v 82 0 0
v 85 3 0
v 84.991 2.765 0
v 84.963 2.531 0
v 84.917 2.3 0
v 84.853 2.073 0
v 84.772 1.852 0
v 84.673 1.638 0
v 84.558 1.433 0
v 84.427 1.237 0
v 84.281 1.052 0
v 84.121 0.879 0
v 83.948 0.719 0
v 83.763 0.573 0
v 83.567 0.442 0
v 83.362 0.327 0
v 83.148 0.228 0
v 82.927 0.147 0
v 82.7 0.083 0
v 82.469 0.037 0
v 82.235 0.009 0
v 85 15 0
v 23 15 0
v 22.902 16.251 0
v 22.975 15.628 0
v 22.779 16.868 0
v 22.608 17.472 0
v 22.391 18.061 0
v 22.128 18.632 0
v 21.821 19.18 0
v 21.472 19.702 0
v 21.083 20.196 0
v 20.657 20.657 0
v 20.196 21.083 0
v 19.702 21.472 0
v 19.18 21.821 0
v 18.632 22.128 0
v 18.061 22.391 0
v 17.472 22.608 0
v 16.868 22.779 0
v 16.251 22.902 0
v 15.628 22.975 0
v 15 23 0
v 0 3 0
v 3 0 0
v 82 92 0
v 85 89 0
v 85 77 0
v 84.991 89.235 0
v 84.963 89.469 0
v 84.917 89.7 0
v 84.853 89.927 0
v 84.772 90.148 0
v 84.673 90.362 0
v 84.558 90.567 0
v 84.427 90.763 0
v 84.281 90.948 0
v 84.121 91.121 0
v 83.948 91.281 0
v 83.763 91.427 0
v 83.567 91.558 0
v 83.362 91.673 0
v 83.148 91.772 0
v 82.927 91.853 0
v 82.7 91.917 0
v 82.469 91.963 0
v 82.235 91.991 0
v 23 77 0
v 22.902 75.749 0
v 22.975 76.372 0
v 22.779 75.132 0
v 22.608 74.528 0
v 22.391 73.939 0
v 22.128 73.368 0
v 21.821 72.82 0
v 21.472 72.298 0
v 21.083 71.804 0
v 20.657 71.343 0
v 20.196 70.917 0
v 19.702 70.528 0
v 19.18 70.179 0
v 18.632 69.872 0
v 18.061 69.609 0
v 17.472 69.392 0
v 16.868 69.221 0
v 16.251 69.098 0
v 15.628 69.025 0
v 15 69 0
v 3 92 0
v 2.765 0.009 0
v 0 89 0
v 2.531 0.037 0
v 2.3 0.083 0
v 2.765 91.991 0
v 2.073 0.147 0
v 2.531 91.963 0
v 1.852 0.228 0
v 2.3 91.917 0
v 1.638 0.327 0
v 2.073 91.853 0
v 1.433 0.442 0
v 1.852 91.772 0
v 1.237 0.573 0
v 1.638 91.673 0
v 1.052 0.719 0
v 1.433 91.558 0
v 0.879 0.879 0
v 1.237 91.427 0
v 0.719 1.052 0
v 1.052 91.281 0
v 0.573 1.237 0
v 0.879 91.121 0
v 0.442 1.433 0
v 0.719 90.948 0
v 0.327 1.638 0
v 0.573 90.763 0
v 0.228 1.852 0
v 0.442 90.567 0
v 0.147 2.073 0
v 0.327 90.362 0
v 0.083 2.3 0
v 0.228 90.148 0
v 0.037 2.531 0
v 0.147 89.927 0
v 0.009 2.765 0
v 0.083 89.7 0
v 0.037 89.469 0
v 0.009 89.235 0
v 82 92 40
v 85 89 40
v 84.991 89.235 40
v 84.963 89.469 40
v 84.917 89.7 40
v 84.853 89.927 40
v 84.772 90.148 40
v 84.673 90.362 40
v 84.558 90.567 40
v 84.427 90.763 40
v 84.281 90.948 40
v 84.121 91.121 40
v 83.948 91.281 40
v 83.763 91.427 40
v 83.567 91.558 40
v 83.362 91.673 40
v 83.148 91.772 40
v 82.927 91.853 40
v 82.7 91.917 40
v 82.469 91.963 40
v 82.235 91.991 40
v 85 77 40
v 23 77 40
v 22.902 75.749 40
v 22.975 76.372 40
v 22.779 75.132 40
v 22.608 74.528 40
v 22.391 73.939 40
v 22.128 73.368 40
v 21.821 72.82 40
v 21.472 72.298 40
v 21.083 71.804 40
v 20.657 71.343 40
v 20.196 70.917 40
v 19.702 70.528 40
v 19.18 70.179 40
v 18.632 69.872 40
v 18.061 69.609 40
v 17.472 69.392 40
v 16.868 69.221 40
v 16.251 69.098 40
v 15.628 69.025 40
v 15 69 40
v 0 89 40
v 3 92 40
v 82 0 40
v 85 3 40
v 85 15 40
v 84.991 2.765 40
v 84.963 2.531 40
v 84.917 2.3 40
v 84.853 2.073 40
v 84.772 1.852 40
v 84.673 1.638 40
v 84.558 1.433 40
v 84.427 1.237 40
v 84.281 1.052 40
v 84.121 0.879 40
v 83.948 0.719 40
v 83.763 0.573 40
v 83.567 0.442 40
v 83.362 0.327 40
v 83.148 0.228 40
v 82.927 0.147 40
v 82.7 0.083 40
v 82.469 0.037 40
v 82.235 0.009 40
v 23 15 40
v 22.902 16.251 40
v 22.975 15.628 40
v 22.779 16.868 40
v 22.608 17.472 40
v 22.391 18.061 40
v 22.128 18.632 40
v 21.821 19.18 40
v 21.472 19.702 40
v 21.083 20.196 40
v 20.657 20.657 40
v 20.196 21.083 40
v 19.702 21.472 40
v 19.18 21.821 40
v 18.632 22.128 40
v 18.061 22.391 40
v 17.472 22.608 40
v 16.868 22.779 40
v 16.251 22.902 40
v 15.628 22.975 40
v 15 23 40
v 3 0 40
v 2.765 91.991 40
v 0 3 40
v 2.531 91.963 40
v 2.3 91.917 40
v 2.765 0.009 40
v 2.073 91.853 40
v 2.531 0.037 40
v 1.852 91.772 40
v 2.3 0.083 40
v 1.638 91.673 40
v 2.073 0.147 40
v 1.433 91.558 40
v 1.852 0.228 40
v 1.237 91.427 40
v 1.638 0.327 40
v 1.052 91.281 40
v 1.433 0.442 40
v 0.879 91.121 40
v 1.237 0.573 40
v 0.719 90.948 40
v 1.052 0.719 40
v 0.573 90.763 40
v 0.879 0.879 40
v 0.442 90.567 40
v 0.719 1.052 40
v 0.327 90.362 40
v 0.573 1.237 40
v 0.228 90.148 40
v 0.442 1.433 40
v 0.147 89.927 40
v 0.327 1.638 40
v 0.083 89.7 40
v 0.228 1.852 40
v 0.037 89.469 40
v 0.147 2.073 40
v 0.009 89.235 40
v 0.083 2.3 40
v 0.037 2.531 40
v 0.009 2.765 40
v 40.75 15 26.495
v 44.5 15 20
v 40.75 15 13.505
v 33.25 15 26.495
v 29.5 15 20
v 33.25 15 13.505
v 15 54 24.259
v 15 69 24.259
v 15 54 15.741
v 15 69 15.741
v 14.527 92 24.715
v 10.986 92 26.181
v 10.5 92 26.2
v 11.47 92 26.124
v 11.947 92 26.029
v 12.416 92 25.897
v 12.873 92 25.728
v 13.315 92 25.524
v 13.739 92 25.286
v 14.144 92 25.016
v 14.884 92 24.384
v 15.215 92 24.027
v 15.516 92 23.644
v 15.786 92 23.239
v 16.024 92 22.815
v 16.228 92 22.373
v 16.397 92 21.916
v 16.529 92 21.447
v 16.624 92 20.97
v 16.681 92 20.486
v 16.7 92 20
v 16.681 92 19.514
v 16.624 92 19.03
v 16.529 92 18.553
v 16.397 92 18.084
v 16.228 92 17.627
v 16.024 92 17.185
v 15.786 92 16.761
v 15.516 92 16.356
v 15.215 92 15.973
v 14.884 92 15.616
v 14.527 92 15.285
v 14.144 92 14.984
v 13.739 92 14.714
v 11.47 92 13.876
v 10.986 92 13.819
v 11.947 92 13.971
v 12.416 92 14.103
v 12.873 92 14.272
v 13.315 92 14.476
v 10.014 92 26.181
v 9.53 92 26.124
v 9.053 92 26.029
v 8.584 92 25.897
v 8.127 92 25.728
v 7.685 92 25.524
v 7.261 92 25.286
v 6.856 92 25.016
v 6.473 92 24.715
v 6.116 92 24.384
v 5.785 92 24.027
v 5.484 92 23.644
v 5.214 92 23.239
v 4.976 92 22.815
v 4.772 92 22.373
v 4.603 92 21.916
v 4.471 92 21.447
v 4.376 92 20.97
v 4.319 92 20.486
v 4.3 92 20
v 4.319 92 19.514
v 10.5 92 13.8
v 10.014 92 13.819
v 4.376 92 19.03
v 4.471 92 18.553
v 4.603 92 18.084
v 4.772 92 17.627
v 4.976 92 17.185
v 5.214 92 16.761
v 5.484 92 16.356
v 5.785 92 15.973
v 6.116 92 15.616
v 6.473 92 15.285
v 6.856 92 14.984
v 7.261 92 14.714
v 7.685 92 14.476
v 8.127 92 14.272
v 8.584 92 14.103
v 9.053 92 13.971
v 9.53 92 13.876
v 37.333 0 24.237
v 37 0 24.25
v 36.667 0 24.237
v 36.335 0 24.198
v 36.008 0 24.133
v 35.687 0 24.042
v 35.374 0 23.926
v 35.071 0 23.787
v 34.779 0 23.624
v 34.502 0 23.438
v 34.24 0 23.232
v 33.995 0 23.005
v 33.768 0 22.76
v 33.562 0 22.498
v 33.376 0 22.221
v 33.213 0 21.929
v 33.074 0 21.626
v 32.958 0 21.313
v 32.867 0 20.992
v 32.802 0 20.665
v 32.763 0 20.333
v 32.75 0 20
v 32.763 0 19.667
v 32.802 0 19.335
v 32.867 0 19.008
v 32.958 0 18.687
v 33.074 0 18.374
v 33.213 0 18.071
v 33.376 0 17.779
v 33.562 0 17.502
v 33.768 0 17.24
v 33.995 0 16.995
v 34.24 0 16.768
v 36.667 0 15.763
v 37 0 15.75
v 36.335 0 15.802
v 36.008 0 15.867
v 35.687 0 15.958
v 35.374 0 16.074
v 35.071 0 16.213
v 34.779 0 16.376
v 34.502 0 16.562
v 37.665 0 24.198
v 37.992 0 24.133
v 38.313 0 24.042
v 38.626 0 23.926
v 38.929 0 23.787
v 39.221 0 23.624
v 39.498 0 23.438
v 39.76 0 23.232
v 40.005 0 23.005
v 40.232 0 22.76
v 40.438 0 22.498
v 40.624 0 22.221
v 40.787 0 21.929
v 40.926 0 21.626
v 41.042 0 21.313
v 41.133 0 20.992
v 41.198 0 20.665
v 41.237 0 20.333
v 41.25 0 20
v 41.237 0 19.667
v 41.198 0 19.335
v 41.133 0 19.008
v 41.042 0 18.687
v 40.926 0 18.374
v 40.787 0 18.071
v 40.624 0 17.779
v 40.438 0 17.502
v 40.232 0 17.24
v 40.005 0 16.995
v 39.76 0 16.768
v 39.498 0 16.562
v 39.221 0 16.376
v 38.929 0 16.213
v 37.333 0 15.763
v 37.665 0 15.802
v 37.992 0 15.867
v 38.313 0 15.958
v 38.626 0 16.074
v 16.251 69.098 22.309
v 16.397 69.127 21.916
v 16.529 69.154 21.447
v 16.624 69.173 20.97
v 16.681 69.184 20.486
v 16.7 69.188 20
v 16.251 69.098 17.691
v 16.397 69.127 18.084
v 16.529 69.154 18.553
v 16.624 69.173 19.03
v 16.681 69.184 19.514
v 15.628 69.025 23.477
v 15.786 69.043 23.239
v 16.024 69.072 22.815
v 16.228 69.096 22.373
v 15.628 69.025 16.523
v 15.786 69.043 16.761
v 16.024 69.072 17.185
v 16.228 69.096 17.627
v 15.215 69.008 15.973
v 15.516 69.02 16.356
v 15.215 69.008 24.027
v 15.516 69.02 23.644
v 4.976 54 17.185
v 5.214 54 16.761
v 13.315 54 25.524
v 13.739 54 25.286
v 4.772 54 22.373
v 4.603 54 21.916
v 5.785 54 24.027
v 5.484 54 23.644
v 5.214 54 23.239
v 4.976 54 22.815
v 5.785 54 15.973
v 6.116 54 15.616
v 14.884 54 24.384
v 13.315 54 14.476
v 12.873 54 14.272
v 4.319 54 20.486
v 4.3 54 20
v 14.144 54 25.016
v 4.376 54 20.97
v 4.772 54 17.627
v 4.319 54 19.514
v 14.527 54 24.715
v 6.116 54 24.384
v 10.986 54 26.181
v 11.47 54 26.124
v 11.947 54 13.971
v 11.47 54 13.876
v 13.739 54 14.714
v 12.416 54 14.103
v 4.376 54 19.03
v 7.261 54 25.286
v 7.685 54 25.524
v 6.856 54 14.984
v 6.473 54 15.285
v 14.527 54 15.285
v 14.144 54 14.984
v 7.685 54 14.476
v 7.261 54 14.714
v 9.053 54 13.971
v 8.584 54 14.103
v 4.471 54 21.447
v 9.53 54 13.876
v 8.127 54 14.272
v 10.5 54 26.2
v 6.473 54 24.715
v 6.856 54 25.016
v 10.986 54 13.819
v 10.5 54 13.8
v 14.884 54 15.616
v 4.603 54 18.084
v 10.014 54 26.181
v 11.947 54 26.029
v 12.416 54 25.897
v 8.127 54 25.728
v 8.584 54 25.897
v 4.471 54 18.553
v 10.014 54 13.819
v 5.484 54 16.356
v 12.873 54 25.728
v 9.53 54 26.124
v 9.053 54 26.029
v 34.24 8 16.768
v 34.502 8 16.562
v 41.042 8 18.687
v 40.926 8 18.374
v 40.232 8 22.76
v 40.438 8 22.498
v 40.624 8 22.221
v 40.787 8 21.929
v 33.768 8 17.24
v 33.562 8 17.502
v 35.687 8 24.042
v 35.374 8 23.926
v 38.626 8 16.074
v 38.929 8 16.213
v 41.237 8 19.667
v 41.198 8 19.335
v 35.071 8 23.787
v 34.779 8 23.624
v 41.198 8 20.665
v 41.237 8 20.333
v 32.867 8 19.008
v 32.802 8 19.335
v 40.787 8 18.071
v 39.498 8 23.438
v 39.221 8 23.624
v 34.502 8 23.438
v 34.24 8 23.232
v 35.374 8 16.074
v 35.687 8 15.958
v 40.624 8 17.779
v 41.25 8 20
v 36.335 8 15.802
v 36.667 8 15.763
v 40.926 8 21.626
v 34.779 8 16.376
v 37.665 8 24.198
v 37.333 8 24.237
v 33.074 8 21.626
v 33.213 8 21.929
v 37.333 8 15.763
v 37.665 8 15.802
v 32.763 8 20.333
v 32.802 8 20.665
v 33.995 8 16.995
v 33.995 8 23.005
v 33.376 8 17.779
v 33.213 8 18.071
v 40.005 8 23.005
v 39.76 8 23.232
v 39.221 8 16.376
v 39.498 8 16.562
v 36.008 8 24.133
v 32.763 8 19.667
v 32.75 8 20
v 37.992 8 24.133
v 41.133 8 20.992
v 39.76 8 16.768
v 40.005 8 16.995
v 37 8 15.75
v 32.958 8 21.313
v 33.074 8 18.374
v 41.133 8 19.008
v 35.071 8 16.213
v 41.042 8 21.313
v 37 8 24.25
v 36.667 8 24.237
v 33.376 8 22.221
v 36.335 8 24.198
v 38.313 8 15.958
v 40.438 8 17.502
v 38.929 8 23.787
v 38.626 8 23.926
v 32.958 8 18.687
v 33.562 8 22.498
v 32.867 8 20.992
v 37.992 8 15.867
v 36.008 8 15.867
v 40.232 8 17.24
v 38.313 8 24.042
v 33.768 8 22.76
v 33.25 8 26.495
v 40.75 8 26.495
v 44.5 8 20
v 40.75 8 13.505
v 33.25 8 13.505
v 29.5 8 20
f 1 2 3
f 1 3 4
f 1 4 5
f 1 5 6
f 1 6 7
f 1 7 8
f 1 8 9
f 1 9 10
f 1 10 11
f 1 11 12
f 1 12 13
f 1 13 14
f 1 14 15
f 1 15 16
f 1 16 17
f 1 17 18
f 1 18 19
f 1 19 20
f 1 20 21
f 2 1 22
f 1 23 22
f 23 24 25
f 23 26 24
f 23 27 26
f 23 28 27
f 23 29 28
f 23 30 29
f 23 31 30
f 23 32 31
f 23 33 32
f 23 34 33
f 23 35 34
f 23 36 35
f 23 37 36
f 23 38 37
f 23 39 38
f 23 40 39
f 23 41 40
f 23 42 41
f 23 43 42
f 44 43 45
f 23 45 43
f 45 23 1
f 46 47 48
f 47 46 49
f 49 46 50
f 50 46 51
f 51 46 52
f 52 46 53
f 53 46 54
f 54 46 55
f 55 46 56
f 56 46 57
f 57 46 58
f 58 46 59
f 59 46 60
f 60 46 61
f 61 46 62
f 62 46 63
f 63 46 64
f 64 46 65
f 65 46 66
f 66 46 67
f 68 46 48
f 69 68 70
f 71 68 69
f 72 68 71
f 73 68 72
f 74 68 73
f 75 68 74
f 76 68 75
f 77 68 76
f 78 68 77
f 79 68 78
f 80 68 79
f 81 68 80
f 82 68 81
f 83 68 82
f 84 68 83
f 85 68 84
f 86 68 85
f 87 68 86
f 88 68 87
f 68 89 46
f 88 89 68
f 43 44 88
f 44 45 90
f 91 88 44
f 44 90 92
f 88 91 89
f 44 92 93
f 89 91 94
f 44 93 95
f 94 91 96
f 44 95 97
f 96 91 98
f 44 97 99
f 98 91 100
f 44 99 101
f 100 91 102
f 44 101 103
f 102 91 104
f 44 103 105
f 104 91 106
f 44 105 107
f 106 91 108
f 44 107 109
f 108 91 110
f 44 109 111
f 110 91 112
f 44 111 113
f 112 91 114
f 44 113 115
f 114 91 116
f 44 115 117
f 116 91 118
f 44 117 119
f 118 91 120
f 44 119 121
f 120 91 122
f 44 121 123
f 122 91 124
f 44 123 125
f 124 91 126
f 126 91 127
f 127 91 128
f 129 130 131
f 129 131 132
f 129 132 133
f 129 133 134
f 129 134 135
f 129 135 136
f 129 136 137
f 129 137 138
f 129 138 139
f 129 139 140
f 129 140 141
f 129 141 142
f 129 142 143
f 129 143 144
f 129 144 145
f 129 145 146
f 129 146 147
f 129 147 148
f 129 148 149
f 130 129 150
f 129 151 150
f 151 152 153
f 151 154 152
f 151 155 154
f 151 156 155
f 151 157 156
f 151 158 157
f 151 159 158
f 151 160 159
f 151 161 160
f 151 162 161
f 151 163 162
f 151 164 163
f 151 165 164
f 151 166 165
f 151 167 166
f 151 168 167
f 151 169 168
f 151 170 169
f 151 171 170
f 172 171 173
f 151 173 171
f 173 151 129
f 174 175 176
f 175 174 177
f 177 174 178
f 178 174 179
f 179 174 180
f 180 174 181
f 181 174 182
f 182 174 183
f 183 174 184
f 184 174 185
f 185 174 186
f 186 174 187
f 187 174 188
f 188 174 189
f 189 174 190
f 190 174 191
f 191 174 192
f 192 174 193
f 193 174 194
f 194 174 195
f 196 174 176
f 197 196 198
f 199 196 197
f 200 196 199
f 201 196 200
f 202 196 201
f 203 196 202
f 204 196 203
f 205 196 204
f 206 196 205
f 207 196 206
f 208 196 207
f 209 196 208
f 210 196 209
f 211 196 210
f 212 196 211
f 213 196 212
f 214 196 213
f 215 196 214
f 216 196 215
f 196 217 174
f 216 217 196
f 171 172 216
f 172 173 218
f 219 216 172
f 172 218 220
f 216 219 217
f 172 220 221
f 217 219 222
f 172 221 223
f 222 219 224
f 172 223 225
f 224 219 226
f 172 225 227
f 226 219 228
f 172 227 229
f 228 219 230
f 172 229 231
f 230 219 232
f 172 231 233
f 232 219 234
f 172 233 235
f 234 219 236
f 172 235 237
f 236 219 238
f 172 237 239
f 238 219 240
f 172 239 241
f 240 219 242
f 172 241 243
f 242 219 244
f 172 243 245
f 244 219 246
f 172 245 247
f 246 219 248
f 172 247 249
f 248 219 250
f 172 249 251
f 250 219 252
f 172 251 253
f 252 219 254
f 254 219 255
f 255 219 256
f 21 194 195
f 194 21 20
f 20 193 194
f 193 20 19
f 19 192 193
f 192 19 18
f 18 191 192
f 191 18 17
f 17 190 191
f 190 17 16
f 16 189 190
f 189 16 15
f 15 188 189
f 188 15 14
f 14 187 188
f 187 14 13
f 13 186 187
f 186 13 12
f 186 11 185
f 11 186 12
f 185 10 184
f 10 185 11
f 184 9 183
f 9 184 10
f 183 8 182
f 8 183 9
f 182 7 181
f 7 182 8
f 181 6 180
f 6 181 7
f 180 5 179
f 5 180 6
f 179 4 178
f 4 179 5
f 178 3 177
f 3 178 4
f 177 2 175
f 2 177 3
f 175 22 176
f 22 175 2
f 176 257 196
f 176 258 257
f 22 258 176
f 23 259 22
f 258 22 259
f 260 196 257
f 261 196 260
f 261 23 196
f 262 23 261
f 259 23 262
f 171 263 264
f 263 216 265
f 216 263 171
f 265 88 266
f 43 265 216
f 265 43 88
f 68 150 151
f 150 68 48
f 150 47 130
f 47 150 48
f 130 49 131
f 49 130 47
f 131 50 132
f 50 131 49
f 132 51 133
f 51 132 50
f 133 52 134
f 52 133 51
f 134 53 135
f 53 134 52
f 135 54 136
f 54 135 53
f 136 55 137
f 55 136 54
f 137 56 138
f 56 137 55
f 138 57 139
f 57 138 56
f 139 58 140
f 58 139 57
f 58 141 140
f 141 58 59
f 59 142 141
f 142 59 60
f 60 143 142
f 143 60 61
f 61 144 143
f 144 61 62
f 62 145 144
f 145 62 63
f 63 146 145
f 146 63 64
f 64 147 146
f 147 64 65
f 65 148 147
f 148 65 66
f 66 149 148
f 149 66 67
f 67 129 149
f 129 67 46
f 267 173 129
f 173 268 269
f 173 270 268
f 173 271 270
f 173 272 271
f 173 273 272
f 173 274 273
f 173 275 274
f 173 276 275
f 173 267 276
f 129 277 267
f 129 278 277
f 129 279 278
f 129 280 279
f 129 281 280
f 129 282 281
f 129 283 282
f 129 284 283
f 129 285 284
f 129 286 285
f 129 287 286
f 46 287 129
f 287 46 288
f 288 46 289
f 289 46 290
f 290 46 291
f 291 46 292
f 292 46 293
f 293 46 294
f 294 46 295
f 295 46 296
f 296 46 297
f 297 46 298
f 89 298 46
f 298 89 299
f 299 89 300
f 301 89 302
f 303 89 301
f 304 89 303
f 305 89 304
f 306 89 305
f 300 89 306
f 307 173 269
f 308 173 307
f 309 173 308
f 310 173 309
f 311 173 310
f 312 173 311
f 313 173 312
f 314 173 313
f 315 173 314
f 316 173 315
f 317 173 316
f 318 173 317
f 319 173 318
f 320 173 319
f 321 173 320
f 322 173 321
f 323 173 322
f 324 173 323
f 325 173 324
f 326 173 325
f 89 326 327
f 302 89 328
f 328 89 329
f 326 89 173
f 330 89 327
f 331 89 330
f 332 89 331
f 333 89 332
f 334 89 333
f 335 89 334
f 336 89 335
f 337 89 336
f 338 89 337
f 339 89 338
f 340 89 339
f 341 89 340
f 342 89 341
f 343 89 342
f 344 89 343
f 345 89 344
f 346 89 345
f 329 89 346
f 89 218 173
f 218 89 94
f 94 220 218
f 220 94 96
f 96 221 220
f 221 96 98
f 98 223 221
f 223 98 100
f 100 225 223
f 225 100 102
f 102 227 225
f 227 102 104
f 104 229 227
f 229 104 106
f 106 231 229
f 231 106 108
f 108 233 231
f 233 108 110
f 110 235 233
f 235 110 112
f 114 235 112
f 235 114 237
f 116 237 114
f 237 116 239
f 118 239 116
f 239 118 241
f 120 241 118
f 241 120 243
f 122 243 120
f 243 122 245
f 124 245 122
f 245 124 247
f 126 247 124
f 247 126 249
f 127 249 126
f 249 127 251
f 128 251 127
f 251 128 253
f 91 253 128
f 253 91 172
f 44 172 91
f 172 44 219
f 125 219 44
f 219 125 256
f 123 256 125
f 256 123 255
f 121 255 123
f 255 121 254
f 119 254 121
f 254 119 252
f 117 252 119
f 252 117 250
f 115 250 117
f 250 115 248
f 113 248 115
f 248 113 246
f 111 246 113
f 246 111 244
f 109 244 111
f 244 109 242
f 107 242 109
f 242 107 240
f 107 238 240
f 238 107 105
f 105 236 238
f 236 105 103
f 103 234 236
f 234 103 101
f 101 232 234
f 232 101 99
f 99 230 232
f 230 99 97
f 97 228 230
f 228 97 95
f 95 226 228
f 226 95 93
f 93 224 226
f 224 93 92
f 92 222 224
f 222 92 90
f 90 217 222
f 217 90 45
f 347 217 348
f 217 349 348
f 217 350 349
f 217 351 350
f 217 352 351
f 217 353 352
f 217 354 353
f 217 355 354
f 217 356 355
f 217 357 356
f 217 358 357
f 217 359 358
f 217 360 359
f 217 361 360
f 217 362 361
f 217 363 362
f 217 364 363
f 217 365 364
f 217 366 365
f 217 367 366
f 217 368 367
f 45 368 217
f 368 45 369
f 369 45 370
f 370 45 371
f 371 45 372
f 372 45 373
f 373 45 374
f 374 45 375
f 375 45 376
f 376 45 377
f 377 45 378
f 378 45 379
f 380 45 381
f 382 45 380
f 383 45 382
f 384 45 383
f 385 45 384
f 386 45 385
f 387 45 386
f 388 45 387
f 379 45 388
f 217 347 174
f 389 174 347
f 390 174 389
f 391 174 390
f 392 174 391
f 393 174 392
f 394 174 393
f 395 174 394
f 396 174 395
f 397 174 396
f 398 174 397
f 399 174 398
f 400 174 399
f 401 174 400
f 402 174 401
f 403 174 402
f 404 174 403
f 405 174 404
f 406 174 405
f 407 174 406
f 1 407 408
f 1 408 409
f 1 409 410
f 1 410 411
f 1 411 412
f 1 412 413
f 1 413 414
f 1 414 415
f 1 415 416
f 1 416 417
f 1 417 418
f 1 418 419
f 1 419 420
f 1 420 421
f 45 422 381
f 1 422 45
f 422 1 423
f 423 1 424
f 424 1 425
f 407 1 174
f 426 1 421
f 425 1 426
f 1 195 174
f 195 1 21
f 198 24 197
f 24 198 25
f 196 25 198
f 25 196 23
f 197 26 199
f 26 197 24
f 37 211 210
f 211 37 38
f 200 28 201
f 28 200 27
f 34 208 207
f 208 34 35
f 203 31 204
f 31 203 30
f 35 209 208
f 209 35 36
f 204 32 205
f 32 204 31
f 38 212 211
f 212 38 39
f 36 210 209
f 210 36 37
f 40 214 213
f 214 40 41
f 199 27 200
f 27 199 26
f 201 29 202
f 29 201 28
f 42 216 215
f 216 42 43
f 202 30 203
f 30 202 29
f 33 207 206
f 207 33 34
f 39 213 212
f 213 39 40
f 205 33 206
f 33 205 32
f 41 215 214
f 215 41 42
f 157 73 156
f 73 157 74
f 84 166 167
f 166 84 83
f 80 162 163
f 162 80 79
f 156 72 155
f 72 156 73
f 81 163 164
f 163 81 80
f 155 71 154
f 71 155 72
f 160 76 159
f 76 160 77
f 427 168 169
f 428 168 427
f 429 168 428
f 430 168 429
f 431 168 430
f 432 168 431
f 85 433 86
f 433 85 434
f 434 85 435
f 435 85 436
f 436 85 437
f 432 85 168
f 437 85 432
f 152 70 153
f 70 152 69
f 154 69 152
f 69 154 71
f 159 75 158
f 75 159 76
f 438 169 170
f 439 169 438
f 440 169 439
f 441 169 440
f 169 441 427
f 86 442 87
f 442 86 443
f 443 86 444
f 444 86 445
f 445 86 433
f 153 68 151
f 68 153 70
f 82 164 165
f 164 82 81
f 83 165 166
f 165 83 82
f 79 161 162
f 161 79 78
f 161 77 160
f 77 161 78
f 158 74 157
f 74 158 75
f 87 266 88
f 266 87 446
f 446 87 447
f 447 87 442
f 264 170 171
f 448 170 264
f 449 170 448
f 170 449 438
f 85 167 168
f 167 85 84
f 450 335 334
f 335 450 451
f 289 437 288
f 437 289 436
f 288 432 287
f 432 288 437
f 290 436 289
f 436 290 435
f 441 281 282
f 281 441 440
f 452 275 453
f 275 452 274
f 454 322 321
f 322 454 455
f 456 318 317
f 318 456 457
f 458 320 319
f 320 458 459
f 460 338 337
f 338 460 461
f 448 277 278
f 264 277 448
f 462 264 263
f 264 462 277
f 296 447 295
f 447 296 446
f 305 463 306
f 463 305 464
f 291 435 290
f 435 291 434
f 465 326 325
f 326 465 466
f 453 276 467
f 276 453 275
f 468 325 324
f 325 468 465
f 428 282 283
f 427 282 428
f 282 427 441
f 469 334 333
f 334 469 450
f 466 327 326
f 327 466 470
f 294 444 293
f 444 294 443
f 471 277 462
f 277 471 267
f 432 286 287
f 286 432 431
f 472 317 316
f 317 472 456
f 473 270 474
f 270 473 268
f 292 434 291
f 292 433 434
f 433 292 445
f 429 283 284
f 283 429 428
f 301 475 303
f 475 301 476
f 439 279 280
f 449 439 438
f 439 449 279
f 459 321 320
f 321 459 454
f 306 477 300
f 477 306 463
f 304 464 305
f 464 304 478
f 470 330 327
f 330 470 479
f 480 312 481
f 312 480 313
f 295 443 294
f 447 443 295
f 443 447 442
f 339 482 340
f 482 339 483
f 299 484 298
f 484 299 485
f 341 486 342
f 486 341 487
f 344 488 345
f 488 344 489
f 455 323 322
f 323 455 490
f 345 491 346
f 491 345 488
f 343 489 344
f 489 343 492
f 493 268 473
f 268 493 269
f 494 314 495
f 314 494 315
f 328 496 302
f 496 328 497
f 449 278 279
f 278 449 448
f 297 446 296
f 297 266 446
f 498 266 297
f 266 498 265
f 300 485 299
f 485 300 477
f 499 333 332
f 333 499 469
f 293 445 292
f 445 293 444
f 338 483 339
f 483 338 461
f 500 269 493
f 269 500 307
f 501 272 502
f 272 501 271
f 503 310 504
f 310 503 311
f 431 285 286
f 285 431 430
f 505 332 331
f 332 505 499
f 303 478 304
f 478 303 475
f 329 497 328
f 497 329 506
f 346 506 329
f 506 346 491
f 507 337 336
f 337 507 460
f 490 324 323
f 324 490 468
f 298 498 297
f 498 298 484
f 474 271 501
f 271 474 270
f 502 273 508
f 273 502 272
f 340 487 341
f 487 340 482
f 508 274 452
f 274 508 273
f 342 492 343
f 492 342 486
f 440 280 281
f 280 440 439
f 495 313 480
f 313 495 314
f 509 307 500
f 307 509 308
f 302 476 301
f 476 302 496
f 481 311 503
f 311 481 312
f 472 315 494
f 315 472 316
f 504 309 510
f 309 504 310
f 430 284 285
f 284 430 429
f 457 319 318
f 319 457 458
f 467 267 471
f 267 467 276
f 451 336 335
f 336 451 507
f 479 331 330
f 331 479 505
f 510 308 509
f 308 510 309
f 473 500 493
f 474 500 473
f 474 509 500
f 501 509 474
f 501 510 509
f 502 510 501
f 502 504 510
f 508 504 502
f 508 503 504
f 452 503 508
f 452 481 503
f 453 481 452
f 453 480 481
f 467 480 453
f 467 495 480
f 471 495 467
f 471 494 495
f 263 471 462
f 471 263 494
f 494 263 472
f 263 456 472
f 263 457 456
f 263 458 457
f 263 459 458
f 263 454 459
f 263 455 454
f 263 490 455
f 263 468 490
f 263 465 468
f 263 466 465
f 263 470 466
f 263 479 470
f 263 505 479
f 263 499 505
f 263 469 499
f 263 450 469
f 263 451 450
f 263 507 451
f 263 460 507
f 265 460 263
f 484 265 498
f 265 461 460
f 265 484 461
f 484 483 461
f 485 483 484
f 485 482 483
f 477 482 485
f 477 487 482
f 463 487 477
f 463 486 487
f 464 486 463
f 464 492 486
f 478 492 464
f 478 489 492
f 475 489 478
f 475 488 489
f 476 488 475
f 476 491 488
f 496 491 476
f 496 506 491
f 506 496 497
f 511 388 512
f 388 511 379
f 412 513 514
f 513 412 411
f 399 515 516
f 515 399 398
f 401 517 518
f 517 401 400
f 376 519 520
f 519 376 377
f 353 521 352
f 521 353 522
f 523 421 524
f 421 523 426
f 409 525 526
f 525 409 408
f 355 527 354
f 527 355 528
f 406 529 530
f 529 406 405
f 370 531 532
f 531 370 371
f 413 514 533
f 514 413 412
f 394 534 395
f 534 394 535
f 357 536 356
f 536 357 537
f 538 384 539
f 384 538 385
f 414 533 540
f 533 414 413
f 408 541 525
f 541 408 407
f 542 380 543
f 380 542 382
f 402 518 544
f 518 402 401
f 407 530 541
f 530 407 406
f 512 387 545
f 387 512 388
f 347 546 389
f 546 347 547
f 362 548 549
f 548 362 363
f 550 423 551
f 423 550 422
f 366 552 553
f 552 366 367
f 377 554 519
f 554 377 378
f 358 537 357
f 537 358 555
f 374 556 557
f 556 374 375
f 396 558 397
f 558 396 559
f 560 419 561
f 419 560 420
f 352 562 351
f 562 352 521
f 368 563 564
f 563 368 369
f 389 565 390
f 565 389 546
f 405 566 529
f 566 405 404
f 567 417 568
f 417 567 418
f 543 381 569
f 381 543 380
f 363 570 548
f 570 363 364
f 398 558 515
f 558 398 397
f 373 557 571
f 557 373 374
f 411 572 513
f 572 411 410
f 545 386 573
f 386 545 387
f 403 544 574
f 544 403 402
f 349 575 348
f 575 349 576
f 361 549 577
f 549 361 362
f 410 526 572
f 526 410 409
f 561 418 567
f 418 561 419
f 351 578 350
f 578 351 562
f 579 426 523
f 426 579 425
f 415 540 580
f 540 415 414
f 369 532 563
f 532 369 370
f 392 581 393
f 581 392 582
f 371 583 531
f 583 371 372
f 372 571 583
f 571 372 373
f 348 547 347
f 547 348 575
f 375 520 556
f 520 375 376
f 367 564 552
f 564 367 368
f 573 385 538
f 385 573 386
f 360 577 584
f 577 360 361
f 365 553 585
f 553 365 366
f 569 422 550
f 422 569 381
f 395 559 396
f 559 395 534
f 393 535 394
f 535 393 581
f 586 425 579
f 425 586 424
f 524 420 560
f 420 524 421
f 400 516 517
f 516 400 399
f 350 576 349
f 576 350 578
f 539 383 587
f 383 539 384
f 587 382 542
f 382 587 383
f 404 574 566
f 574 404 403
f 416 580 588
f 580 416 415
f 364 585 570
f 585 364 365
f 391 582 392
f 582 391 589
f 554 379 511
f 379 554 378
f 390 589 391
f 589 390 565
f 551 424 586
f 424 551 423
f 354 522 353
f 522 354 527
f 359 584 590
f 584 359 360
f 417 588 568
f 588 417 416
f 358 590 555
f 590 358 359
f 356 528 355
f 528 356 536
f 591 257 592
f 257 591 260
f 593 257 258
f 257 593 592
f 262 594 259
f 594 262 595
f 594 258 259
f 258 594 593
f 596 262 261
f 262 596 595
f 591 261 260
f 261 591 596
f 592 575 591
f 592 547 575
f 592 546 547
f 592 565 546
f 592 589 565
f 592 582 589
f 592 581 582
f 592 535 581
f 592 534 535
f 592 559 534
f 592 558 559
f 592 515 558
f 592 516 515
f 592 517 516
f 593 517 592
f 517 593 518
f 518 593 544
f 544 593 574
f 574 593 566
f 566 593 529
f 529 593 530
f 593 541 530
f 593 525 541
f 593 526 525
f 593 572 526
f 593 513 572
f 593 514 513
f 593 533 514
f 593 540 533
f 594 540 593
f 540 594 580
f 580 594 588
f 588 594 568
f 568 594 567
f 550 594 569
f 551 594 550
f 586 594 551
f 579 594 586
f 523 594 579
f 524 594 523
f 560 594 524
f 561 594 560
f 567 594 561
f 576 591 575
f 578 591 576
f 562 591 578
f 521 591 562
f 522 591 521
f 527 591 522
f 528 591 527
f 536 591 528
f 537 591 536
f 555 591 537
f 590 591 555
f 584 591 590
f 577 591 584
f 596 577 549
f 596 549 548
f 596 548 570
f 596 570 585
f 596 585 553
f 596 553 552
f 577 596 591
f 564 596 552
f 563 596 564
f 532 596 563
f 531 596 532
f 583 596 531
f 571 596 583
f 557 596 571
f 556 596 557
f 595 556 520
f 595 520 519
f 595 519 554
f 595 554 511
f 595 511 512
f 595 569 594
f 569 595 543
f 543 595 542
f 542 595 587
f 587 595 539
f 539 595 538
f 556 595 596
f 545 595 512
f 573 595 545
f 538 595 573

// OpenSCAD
// =============================================================================
// PROGETTO: MORSETTO A C COMPLETO PER BRACCIO MICROFONO (ALTERNATIVE COMPLETA)
// Progettato per essere stampato sdraiato sul fianco (massima resistenza meccanica)
// =============================================================================

$fn = 80;

/* [Dimensioni Generali Morsetto] */
// Apertura della bocca (spazio utile per la scrivania)
apertura_scrivania = 62.0; // Adatto per tavoli fino a 58-60mm

// Profondita utile della gola del morsetto
profondita_gola = 45.0;

// Spessore delle pareti portanti a C (minimo 12-14mm per reggere la flessione)
spessore_struttura = 15.0;

// Larghezza complessiva del morsetto (estrusione)
larghezza_morsetto = 40.0;

// Raggio di raccordo interno agli angoli (fondamentale contro le rotture)
raggio_raccordo_interno = 8.0;

/* [Alloggiamento Perno Braccio Microfonico] */
// Diametro perno braccio (standard 12.0mm + tolleranza)
diametro_perno_braccio = 12.4;
profondita_foro_braccio = 38.0;

/* [Filettatura / Dado M8 per la Vite] */
// Diametro foro per barra filettata M8
diametro_foro_vite = 8.5;
// Sede esagonale per dado standard M8 (chiave 13mm -> diametro circoscritto ~14.8mm)
diametro_dado_m8 = 15.0;
spessore_dado_m8 = 7.0;

module morsetto_2d() {
    difference() {
        // Profilo esterno
        offset(r = 3) offset(r = -3)
        square([profondita_gola + spessore_struttura + 25, apertura_scrivania + 2 * spessore_struttura]);
        
        // Vano gola interna
        translate([spessore_struttura, spessore_struttura])
            square([profondita_gola + 30, apertura_scrivania]);
    }
}

module morsetto_3d() {
    difference() {
        union() {
            // Estrusione del profilo
            linear_extrude(height = larghezza_morsetto)
                morsetto_2d();
                
            // Raccordo interno d'angolo inferiore
            translate([spessore_struttura, spessore_struttura, 0])
                cylinder(r = raggio_raccordo_interno, h = larghezza_morsetto);
                
            // Raccordo interno d'angolo superiore
            translate([spessore_struttura, spessore_struttura + apertura_scrivania, 0])
                cylinder(r = raggio_raccordo_interno, h = larghezza_morsetto);
        }
        
        // Foro verticale per il perno del braccio microfonico (sul blocco posteriore/superiore)
        translate([spessore_struttura / 2 + 3, spessore_struttura + apertura_scrivania + spessore_struttura - profondita_foro_braccio, larghezza_morsetto / 2])
            rotate([-90, 0, 0])
                cylinder(d = diametro_perno_braccio, h = profondita_foro_braccio + 10);
                
        // Foro passante per la vite M8 di serraggio (sul braccio inferiore)
        translate([spessore_struttura + 22, -5, larghezza_morsetto / 2])
            rotate([-90, 0, 0])
                cylinder(d = diametro_foro_vite, h = spessore_struttura + 10);
                
        // Tasca esagonale per incassare un dado M8 sotto la base
        translate([spessore_struttura + 22, spessore_struttura - spessore_dado_m8, larghezza_morsetto / 2])
            rotate([-90, 0, 0])
                cylinder(d = diametro_dado_m8, h = spessore_dado_m8 + 0.1, $fn = 6);
    }
}

// Visualizzazione per stampa: sdraiato sul fianco per orientare i layer parallelamente al carico
morsetto_3d();
